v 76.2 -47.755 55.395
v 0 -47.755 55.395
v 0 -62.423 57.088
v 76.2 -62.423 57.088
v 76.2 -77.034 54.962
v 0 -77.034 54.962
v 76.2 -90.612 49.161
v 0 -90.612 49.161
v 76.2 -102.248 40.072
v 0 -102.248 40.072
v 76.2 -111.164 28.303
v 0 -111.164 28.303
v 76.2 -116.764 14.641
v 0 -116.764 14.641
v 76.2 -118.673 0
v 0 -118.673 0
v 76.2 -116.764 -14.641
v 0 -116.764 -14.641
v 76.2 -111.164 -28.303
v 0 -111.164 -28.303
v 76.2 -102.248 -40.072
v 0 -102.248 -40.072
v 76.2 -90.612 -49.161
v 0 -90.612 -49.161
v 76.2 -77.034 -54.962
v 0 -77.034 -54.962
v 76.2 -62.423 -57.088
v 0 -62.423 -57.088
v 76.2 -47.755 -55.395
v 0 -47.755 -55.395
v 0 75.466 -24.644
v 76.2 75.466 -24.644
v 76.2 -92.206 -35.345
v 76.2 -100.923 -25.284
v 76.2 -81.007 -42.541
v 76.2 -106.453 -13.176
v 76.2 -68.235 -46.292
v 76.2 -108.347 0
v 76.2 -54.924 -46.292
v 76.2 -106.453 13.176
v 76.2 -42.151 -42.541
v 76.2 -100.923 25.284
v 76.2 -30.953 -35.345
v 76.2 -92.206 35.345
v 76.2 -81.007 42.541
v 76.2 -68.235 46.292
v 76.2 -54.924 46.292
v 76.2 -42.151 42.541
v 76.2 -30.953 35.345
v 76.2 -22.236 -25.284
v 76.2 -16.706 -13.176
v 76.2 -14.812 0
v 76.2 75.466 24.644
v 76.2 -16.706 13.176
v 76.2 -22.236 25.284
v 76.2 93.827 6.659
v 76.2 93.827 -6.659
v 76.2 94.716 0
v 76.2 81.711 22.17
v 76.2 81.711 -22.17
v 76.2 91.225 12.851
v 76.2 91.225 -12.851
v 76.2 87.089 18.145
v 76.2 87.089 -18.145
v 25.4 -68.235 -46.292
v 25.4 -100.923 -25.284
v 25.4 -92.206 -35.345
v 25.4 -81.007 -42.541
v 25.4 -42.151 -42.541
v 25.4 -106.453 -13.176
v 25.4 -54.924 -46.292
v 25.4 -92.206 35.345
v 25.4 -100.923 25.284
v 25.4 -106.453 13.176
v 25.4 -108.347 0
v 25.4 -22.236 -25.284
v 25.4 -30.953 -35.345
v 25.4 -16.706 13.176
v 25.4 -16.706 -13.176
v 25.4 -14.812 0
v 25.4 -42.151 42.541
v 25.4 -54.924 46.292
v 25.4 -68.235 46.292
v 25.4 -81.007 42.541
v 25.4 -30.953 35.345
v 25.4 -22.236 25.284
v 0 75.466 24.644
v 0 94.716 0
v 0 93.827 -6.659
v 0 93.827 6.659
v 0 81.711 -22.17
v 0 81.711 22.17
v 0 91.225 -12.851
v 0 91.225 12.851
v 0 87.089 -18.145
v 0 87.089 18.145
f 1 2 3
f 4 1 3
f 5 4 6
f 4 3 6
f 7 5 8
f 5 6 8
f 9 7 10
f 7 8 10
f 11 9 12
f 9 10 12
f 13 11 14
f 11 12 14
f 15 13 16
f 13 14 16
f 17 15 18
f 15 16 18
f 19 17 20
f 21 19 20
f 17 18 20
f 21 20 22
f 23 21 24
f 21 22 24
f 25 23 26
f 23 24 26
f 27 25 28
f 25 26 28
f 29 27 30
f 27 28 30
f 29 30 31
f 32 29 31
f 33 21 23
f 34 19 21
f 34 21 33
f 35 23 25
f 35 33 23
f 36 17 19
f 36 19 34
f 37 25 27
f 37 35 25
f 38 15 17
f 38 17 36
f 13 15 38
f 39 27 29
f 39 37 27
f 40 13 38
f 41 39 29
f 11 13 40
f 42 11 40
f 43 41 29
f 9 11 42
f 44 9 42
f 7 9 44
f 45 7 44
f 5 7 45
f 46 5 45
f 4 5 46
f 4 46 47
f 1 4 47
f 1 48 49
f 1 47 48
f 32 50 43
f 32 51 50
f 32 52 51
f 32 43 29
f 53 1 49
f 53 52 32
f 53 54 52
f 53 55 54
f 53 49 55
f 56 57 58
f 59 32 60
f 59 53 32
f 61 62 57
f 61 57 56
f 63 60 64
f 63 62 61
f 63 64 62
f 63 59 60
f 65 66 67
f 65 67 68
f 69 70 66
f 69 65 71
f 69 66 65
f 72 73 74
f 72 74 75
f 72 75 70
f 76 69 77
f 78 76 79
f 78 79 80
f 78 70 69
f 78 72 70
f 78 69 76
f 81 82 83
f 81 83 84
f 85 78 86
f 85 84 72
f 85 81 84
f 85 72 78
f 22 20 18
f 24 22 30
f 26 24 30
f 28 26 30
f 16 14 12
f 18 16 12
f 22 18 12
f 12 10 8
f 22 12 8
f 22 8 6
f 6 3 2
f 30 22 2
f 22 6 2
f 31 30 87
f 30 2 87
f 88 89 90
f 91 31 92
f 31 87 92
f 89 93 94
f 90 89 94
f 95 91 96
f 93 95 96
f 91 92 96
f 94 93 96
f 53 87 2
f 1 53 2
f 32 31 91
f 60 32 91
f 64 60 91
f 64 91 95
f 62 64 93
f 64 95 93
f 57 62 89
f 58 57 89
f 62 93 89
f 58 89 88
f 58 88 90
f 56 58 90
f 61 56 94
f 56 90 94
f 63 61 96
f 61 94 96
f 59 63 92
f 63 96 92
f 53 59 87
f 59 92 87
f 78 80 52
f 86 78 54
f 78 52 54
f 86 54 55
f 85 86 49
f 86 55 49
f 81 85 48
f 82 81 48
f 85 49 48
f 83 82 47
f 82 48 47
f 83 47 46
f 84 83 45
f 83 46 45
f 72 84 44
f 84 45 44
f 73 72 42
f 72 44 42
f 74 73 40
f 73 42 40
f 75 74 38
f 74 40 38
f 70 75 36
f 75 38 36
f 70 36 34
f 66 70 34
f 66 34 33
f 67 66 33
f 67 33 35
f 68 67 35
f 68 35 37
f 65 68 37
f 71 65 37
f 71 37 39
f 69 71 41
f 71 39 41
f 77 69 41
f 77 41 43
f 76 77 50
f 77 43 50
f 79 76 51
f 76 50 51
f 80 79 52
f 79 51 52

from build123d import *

# Parameters (mm, degrees)
F1_DEPTH = 76.2
F2_R     = 46.767549
F3_DEPTH = 50.8


with BuildPart() as f1:
    # F0 (on Right) → F1 (new body)
    with BuildSketch(Plane.YZ):
        with BuildLine():
            ThreePointArc((-47.755212, -55.394912), (-16.585087, -35.145607), (-4.485609, 0))
            ThreePointArc((-4.485609, 0), (-16.585087, 35.145607), (-47.755212, 55.394912))
            ThreePointArc((-47.755212, 55.394912), (-118.673271, 0), (-47.755212, -55.394912))
        make_face()
        with BuildLine():
            ThreePointArc((-47.755212, 55.394912), (-16.585087, 35.145607), (-4.485609, 0))
            ThreePointArc((-4.485609, 0), (-16.585087, -35.145607), (-47.755212, -55.394912))
            Line((-47.755212, -55.394912), (75.465698, -24.644182))
            ThreePointArc((75.465698, -24.644182), (43.915552, 0), (75.465698, 24.644182))
            Line((75.465698, 24.644182), (-47.755212, 55.394912))
        make_face()
        with BuildLine():
            ThreePointArc((94.715552, 0), (89.332716, 15.635637), (75.465698, 24.644182))
            ThreePointArc((75.465698, 24.644182), (43.915552, 0), (75.465698, -24.644182))
            ThreePointArc((75.465698, -24.644182), (89.332716, -15.635637), (94.715552, 0))
        make_face()
    extrude(amount=F1_DEPTH)

    # F2 (on face) → F3 (cut)
    with BuildSketch(Plane.YZ.offset(76.2)):
        with Locations((-61.57944, 0)):
            Circle(F2_R)
    extrude(amount=-F3_DEPTH, mode=Mode.SUBTRACT)


solid = f1.part
